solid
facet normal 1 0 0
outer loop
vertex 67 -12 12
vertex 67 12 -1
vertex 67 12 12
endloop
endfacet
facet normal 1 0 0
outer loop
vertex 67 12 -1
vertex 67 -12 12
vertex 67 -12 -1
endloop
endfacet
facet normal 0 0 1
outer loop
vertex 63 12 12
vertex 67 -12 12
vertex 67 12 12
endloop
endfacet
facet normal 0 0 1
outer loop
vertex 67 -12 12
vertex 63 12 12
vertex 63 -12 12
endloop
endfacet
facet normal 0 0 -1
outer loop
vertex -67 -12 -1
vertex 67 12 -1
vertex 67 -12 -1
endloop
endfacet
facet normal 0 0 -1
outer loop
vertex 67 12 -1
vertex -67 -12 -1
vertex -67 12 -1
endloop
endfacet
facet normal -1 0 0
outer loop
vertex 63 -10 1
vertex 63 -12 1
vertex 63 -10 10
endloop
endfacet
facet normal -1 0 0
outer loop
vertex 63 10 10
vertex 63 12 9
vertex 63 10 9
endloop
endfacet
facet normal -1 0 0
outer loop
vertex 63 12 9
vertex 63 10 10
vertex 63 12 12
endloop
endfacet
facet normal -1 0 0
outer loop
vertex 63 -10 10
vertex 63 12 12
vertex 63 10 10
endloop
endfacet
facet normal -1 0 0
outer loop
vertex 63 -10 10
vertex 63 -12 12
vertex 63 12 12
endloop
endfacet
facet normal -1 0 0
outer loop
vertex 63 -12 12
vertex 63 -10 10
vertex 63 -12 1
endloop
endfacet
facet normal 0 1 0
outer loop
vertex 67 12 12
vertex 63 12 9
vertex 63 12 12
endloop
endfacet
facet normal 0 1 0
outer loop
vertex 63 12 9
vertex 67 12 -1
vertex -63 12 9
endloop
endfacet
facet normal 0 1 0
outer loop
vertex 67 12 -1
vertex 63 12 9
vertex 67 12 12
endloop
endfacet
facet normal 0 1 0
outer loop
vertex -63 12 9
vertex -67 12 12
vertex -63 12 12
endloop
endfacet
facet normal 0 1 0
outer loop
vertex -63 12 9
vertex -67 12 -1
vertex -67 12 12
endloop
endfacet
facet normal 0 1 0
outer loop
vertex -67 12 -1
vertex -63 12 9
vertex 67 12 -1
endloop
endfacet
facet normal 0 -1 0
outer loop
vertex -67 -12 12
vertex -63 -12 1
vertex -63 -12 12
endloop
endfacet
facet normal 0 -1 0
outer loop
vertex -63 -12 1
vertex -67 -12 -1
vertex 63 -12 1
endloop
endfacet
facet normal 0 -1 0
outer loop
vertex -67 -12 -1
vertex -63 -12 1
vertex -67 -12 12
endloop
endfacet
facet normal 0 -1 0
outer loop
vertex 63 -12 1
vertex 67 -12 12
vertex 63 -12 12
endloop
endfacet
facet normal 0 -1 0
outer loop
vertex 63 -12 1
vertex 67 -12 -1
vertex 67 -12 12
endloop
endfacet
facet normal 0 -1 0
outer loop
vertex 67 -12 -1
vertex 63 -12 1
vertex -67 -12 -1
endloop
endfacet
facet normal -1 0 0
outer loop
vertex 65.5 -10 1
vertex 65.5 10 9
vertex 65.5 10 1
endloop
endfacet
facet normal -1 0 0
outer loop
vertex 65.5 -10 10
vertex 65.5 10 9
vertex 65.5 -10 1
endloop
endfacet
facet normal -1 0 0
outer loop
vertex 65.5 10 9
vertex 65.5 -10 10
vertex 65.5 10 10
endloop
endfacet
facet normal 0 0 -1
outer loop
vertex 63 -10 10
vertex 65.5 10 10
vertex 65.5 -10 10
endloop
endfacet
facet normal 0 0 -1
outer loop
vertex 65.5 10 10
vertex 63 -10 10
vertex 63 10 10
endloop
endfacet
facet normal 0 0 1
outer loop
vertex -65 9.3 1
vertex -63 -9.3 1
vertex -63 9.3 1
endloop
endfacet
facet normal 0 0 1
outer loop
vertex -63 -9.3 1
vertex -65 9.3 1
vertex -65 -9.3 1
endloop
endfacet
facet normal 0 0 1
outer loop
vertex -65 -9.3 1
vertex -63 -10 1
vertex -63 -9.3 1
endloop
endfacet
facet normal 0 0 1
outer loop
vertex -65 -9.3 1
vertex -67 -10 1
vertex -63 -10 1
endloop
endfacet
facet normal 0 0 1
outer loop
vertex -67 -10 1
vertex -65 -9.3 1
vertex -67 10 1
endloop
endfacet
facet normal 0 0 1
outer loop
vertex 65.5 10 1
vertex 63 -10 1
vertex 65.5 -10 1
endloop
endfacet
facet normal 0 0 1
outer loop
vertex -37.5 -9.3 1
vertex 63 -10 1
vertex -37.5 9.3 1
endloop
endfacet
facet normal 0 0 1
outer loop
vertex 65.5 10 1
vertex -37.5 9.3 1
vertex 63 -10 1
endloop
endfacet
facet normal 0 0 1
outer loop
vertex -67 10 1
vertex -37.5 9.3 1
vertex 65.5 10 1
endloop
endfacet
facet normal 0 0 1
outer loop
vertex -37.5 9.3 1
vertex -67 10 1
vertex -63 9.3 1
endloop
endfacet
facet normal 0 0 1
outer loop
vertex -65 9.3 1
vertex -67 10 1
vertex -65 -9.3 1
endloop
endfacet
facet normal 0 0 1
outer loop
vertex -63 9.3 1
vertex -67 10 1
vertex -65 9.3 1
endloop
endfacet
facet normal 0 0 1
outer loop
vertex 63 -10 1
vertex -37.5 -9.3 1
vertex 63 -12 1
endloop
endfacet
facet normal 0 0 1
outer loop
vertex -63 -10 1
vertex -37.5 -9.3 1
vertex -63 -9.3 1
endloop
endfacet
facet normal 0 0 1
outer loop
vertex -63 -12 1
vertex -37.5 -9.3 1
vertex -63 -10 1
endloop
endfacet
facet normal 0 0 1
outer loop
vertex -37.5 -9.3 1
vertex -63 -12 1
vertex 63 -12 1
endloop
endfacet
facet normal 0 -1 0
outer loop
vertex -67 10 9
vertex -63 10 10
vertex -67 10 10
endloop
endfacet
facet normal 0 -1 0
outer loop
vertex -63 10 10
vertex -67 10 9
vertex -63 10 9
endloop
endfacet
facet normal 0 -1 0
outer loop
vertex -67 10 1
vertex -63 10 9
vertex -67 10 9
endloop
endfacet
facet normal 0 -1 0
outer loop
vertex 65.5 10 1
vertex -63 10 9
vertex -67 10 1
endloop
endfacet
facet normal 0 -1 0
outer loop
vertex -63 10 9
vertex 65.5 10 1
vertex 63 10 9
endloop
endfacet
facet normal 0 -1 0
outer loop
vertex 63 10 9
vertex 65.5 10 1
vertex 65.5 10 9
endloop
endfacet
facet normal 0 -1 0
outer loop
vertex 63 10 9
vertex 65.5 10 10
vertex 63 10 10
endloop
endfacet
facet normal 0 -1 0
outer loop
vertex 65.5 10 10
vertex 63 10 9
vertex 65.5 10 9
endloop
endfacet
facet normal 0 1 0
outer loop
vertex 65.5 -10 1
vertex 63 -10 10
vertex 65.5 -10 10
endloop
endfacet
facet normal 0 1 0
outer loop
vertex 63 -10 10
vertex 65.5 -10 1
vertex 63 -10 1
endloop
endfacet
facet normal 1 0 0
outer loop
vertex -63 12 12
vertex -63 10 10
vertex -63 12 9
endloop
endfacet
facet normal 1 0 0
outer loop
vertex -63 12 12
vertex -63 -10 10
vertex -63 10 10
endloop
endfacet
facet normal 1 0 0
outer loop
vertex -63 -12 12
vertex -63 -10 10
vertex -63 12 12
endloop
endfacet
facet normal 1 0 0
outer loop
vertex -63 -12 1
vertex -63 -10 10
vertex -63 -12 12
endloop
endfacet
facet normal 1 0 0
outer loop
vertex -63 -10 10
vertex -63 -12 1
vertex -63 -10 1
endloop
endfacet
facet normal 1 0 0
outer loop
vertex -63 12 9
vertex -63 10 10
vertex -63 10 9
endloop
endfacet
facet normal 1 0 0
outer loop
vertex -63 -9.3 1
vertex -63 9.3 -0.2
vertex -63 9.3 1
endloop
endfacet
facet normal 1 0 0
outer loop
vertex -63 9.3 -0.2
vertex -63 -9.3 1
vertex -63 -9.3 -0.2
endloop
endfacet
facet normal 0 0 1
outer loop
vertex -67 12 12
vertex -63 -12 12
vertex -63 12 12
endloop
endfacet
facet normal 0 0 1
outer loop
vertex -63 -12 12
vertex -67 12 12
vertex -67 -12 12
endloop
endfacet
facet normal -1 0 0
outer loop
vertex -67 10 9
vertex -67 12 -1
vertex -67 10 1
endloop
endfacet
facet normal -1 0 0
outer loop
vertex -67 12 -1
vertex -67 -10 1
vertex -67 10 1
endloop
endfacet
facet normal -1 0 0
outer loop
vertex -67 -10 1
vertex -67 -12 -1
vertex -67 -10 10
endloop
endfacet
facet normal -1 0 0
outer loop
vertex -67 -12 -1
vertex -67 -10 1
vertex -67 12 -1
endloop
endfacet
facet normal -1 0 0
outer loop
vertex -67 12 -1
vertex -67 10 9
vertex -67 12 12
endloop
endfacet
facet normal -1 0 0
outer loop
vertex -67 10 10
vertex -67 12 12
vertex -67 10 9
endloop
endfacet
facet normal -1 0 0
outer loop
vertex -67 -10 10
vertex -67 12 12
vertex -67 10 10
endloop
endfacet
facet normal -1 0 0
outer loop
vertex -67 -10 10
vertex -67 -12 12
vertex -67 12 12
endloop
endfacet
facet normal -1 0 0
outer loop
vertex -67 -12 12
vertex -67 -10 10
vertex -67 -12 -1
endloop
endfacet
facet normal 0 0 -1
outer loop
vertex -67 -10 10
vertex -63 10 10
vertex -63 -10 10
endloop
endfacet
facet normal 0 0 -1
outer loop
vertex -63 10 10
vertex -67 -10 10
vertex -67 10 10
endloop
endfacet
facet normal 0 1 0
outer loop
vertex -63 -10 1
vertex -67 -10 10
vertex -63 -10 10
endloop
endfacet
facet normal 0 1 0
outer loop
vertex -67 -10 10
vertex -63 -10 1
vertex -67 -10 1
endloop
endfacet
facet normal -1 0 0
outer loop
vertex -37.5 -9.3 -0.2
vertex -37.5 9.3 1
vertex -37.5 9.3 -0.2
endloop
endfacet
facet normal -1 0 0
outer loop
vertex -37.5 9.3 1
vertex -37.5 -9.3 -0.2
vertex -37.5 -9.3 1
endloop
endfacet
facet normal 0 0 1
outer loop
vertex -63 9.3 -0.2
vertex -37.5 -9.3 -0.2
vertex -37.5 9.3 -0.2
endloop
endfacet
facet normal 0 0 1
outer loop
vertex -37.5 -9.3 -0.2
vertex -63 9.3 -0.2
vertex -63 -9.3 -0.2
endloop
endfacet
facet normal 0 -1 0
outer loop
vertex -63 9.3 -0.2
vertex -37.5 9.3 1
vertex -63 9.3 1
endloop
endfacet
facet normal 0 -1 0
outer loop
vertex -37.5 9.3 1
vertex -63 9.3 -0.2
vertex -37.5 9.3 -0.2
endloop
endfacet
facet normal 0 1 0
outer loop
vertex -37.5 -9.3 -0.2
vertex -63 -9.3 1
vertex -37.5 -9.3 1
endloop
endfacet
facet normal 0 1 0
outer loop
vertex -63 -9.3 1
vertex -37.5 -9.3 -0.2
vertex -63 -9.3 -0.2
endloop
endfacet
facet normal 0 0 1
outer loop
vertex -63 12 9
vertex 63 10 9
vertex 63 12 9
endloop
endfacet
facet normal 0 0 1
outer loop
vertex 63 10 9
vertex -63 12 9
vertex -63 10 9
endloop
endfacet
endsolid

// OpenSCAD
// ISUE 2016

//constants
thickness     = 2;

ipd           = 68; // change to your ipd
half_ipd      = ipd/2;
cam_width     = 40;
post_height   = 16;

// realsense dims
r_width       = 20;
r_length      = 130;
r_height      = 9;

height        = cam_width + r_width + 4;
/*
translate([0, cam_width/4, 0]) {
  cube([ipd - cam_width, height, thickness], center=true);
}

// left cam
 translate([-half_ipd, 0, 0]) {
    difference() {
      $fn=50;
      minkowski() {
        translate([0, cam_width/4, 0])
        cube([cam_width, height, thickness], center=true);
      }
      translate([0,0,-(thickness/2 + 1)]) {
        cylinder(r=14, h=thickness + 2);
      }
    }

    // left posts
    for (i = [-1 : 2 : 1]) {
        for (j = [-1 : 2 : 1]) {
            translate([i*14,j*14, .4]) {
                difference() {
                    cylinder(h = post_height, r = 3, $fs=.5);
                    cylinder(h = post_height + 1, r = 1, $fs=.5);
                    
                }
                cylinder(h = post_height/2, r1 = 5, r2 = 3, $fs=.5);
            }
        }
    }
}


// right cam
translate([half_ipd, 0, 0]) {
    difference() {
      $fn=50;
      minkowski() {
        translate([0, cam_width/4, 0])
        cube([cam_width, height, thickness], center=true);
      }
      translate([0,0,-(thickness/2 + 1)]) {
        cylinder(r=14, h=thickness + 2);
      }
    }

    // right posts
    for (i = [-1 : 2 : 1]) {
        for (j = [-1 : 2 : 1]) {
            translate([i*14,j*14, .4]) {
                difference() {
                    cylinder(h = post_height, r = 3, $fs=.5);
                    cylinder(h = post_height + 1, r = 1, $fs=.5);
                }
                cylinder(h = post_height/2, r1 = 5, r2 = 3, $fs=.5);
            }
        }
    }
}

// realsense holder

translate([r_length/2, cam_width/2 + r_width/2, thickness/2 + r_height/2]) {
  */
  
cap_thickness = 4;
translate([0,0,thickness/2 + r_height/2]) {
  
  translate([r_length/2, 0, 0]) {
    difference() {
        cube([cap_thickness, r_width + cap_thickness, r_height+cap_thickness], center=true);
        translate([-cap_thickness / 2, 0, 0]) {
            cube([cap_thickness + 1, r_width, r_height], center=true);
        }
    }
  }

  
  translate([-r_length/2, 0, 0]) {
    difference() {
      cube([cap_thickness, r_width + cap_thickness, r_height+cap_thickness], center=true);
      translate([0, 0, 0]) {
        cube([cap_thickness + 1, r_width, r_height], center=true);
      }
    }
  }

}

mag_width = 27.5;
mag_height = 18.6;
mag_depth = 1.2;
//translate([0, cam_width/2 + r_width/2, 0]) {
translate() {
difference() {
    cube([r_length + 4, r_width + 4, thickness], center=true);
    translate([-r_length/2 + mag_width / 2,0,thickness/2 - mag_depth/2])
    cube([mag_width, mag_height, mag_depth], center=true);
}
   
translate([0,r_width/2 + cap_thickness/4,r_height/2]) {
cube([r_length + 4, cap_thickness/2, r_height], center=true);
}
}
